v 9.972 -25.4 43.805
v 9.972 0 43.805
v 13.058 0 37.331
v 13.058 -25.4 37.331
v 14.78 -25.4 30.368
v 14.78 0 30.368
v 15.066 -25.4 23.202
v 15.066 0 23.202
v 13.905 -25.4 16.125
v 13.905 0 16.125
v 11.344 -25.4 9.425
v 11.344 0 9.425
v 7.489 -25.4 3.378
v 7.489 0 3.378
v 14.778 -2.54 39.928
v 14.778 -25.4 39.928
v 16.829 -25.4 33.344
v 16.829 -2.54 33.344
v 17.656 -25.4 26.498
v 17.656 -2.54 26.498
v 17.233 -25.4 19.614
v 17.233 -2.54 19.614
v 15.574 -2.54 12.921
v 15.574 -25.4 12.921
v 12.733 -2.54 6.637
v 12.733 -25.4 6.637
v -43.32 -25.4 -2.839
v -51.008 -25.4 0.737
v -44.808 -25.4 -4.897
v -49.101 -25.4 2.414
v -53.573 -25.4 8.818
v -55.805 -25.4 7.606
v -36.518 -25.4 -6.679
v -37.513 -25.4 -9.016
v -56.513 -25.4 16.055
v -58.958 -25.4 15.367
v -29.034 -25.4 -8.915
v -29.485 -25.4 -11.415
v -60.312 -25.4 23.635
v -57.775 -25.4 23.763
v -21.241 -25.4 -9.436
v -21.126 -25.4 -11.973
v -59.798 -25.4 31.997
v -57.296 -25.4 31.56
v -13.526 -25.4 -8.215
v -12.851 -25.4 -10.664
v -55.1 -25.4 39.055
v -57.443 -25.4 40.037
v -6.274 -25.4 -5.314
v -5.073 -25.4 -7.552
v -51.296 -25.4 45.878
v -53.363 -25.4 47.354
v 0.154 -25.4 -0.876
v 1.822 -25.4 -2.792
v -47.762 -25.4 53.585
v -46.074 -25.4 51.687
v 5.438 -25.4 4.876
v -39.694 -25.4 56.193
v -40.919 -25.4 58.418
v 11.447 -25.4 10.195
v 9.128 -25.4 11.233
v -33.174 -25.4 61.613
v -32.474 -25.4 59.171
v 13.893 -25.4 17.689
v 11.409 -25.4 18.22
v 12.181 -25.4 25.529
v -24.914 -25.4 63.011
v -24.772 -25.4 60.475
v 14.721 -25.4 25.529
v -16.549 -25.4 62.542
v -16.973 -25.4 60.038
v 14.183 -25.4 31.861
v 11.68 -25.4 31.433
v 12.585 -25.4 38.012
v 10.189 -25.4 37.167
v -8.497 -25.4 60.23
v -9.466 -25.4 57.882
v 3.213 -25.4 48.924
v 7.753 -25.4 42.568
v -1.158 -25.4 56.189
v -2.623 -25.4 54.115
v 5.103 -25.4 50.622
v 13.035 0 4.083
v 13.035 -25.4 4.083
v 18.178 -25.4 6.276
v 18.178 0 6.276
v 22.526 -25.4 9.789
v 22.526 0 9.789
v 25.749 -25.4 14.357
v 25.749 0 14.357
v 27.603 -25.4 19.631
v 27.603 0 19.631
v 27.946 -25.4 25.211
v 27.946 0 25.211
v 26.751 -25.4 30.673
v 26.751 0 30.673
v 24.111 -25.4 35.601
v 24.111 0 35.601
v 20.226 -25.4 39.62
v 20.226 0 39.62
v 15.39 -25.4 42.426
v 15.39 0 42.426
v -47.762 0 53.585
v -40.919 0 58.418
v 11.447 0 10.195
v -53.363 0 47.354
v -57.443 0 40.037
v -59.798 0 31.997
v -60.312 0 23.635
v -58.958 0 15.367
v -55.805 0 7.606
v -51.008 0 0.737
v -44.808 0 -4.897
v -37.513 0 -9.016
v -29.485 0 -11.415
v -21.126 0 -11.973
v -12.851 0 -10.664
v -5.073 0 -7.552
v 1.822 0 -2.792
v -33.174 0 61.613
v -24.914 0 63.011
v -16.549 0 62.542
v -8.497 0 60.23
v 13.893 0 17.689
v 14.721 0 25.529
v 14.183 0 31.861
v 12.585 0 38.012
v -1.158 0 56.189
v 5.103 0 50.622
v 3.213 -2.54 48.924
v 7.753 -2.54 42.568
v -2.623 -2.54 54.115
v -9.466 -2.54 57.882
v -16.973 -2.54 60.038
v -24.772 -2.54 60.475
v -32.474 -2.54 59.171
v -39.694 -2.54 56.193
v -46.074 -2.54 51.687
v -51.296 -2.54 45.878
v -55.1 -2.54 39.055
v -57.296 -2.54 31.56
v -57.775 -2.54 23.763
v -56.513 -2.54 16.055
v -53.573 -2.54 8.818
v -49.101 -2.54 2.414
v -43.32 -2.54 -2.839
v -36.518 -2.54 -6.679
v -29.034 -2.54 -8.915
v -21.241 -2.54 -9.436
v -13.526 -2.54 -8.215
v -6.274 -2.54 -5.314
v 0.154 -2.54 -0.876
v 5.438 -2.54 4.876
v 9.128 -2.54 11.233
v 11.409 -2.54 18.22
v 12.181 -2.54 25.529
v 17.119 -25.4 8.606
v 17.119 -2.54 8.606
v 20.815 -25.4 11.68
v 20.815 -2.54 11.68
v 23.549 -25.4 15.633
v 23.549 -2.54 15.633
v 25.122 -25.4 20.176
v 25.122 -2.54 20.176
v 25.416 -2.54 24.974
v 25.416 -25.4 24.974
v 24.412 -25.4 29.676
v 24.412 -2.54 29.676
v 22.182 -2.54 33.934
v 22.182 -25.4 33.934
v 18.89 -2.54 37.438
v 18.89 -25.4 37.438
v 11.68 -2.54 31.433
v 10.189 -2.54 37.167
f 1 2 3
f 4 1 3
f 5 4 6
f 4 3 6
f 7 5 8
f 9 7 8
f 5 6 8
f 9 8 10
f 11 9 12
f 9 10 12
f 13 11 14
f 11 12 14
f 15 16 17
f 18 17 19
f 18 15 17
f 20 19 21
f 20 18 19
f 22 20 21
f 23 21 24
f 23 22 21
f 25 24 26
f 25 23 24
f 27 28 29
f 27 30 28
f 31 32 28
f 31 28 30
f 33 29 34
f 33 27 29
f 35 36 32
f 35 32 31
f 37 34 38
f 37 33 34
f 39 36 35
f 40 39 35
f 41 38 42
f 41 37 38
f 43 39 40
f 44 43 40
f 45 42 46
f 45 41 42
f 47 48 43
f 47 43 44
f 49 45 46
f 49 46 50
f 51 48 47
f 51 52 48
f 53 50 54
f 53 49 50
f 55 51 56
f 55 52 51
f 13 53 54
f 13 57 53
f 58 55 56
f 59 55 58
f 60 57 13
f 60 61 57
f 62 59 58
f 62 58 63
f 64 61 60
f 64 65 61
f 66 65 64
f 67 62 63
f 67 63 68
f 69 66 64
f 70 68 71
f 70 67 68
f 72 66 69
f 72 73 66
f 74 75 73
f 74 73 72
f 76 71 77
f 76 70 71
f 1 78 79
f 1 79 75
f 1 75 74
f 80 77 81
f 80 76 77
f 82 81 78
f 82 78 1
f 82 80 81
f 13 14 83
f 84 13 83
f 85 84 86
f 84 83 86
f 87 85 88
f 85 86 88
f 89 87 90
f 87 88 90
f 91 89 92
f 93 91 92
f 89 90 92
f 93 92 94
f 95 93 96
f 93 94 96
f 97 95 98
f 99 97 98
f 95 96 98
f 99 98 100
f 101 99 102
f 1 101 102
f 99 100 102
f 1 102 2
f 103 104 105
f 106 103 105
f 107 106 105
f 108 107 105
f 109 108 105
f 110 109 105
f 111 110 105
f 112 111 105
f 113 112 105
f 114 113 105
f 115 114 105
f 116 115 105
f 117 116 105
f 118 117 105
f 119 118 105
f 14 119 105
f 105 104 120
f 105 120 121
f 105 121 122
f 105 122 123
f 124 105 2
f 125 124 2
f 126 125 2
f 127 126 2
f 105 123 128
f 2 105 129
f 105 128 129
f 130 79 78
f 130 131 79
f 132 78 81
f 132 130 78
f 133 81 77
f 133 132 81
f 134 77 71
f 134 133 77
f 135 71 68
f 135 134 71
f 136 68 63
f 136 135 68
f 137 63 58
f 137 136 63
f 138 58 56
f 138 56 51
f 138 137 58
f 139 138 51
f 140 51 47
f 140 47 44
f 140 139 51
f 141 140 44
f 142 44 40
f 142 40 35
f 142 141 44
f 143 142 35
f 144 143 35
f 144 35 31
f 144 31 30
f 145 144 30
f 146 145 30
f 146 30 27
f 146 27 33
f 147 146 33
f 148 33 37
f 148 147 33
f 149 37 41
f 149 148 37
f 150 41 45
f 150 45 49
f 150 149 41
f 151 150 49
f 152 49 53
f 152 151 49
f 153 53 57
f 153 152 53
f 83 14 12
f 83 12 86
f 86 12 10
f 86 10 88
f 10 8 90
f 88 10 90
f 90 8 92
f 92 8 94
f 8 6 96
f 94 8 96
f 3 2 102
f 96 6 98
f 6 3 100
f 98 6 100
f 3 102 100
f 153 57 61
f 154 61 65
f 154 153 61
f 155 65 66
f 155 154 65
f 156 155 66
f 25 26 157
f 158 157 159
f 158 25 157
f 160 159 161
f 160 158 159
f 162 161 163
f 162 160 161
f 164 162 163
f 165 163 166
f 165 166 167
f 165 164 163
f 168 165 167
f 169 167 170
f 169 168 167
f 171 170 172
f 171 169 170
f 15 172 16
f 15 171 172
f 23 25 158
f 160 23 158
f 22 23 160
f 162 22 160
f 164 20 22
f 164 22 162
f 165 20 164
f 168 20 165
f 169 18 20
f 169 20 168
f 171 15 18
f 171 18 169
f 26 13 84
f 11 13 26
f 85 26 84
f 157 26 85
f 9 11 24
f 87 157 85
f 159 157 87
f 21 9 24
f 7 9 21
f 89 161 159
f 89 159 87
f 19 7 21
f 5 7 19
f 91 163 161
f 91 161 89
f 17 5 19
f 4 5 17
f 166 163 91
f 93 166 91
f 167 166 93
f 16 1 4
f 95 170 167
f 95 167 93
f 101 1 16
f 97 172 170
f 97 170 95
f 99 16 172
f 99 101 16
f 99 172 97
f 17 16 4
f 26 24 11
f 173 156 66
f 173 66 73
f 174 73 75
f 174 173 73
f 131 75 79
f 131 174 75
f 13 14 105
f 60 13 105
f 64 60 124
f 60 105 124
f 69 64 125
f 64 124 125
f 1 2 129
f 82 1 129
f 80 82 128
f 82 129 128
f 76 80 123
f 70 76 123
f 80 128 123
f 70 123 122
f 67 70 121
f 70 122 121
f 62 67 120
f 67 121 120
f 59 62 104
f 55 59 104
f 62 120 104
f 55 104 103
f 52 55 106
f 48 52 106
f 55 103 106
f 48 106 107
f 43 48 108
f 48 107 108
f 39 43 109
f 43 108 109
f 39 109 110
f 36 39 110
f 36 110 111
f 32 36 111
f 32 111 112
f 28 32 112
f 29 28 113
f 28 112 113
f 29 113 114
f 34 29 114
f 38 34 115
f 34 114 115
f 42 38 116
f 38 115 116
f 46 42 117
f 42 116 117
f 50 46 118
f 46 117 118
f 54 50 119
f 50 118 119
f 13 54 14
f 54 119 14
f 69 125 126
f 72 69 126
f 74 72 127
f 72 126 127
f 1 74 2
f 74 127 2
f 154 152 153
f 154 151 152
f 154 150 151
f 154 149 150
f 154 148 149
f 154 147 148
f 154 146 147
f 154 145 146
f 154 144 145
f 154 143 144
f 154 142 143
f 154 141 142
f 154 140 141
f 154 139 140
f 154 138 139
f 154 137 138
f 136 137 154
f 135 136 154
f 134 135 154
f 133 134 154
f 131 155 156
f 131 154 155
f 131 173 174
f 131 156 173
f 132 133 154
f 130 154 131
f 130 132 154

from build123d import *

# Parameters (mm, degrees)
F1_DEPTH = 25.4
F2_T     = -2.54
F2_2_T   = -2.54


with BuildPart() as f1:
    # F0 (on Front) → F1 (new body)
    with BuildSketch(Plane.XZ):
        with BuildLine():
            ThreePointArc((7.4890239755, 3.3776608035), (12.8672812185, 13.8780094101), (14.7210613775, 25.529038161))
            ThreePointArc((14.7210613775, 25.529038161), (13.5144494489, 34.9702915027), (9.9721789394, 43.8046277339))
            ThreePointArc((9.9721789394, 43.8046277339), (-60.2889464795, 27.8305479659), (7.4890239755, 3.3776608035))
        make_face()
    extrude(amount=F1_DEPTH)

    # F2#2
    f2_2_openings = [f1.faces().sort_by_distance(p)[0] for p in [
        (-22.819251, -25.4, 25.529038),
    ]]
    offset(amount=F2_2_T, openings=f2_2_openings)


with BuildPart() as f1b:
    # F0 (on Front) → F1, piece 2 (new body)
    with BuildSketch(Plane.XZ):
        with BuildLine():
            ThreePointArc((7.4890239755, 3.3776608035), (27.9674398386, 22.4095554842), (9.9721789394, 43.8046277339))
            ThreePointArc((9.9721789394, 43.8046277339), (15.0657511021, 23.2020189031), (7.4890239755, 3.3776608035))
        make_face()
    extrude(amount=F1_DEPTH)

    # F2
    f2_openings = [f1b.faces().sort_by_distance(p)[0] for p in [
        (19.125855, -25.4, 22.952634),
    ]]
    offset(amount=F2_T, openings=f2_openings)


solid = Compound([f1.part, f1b.part])
